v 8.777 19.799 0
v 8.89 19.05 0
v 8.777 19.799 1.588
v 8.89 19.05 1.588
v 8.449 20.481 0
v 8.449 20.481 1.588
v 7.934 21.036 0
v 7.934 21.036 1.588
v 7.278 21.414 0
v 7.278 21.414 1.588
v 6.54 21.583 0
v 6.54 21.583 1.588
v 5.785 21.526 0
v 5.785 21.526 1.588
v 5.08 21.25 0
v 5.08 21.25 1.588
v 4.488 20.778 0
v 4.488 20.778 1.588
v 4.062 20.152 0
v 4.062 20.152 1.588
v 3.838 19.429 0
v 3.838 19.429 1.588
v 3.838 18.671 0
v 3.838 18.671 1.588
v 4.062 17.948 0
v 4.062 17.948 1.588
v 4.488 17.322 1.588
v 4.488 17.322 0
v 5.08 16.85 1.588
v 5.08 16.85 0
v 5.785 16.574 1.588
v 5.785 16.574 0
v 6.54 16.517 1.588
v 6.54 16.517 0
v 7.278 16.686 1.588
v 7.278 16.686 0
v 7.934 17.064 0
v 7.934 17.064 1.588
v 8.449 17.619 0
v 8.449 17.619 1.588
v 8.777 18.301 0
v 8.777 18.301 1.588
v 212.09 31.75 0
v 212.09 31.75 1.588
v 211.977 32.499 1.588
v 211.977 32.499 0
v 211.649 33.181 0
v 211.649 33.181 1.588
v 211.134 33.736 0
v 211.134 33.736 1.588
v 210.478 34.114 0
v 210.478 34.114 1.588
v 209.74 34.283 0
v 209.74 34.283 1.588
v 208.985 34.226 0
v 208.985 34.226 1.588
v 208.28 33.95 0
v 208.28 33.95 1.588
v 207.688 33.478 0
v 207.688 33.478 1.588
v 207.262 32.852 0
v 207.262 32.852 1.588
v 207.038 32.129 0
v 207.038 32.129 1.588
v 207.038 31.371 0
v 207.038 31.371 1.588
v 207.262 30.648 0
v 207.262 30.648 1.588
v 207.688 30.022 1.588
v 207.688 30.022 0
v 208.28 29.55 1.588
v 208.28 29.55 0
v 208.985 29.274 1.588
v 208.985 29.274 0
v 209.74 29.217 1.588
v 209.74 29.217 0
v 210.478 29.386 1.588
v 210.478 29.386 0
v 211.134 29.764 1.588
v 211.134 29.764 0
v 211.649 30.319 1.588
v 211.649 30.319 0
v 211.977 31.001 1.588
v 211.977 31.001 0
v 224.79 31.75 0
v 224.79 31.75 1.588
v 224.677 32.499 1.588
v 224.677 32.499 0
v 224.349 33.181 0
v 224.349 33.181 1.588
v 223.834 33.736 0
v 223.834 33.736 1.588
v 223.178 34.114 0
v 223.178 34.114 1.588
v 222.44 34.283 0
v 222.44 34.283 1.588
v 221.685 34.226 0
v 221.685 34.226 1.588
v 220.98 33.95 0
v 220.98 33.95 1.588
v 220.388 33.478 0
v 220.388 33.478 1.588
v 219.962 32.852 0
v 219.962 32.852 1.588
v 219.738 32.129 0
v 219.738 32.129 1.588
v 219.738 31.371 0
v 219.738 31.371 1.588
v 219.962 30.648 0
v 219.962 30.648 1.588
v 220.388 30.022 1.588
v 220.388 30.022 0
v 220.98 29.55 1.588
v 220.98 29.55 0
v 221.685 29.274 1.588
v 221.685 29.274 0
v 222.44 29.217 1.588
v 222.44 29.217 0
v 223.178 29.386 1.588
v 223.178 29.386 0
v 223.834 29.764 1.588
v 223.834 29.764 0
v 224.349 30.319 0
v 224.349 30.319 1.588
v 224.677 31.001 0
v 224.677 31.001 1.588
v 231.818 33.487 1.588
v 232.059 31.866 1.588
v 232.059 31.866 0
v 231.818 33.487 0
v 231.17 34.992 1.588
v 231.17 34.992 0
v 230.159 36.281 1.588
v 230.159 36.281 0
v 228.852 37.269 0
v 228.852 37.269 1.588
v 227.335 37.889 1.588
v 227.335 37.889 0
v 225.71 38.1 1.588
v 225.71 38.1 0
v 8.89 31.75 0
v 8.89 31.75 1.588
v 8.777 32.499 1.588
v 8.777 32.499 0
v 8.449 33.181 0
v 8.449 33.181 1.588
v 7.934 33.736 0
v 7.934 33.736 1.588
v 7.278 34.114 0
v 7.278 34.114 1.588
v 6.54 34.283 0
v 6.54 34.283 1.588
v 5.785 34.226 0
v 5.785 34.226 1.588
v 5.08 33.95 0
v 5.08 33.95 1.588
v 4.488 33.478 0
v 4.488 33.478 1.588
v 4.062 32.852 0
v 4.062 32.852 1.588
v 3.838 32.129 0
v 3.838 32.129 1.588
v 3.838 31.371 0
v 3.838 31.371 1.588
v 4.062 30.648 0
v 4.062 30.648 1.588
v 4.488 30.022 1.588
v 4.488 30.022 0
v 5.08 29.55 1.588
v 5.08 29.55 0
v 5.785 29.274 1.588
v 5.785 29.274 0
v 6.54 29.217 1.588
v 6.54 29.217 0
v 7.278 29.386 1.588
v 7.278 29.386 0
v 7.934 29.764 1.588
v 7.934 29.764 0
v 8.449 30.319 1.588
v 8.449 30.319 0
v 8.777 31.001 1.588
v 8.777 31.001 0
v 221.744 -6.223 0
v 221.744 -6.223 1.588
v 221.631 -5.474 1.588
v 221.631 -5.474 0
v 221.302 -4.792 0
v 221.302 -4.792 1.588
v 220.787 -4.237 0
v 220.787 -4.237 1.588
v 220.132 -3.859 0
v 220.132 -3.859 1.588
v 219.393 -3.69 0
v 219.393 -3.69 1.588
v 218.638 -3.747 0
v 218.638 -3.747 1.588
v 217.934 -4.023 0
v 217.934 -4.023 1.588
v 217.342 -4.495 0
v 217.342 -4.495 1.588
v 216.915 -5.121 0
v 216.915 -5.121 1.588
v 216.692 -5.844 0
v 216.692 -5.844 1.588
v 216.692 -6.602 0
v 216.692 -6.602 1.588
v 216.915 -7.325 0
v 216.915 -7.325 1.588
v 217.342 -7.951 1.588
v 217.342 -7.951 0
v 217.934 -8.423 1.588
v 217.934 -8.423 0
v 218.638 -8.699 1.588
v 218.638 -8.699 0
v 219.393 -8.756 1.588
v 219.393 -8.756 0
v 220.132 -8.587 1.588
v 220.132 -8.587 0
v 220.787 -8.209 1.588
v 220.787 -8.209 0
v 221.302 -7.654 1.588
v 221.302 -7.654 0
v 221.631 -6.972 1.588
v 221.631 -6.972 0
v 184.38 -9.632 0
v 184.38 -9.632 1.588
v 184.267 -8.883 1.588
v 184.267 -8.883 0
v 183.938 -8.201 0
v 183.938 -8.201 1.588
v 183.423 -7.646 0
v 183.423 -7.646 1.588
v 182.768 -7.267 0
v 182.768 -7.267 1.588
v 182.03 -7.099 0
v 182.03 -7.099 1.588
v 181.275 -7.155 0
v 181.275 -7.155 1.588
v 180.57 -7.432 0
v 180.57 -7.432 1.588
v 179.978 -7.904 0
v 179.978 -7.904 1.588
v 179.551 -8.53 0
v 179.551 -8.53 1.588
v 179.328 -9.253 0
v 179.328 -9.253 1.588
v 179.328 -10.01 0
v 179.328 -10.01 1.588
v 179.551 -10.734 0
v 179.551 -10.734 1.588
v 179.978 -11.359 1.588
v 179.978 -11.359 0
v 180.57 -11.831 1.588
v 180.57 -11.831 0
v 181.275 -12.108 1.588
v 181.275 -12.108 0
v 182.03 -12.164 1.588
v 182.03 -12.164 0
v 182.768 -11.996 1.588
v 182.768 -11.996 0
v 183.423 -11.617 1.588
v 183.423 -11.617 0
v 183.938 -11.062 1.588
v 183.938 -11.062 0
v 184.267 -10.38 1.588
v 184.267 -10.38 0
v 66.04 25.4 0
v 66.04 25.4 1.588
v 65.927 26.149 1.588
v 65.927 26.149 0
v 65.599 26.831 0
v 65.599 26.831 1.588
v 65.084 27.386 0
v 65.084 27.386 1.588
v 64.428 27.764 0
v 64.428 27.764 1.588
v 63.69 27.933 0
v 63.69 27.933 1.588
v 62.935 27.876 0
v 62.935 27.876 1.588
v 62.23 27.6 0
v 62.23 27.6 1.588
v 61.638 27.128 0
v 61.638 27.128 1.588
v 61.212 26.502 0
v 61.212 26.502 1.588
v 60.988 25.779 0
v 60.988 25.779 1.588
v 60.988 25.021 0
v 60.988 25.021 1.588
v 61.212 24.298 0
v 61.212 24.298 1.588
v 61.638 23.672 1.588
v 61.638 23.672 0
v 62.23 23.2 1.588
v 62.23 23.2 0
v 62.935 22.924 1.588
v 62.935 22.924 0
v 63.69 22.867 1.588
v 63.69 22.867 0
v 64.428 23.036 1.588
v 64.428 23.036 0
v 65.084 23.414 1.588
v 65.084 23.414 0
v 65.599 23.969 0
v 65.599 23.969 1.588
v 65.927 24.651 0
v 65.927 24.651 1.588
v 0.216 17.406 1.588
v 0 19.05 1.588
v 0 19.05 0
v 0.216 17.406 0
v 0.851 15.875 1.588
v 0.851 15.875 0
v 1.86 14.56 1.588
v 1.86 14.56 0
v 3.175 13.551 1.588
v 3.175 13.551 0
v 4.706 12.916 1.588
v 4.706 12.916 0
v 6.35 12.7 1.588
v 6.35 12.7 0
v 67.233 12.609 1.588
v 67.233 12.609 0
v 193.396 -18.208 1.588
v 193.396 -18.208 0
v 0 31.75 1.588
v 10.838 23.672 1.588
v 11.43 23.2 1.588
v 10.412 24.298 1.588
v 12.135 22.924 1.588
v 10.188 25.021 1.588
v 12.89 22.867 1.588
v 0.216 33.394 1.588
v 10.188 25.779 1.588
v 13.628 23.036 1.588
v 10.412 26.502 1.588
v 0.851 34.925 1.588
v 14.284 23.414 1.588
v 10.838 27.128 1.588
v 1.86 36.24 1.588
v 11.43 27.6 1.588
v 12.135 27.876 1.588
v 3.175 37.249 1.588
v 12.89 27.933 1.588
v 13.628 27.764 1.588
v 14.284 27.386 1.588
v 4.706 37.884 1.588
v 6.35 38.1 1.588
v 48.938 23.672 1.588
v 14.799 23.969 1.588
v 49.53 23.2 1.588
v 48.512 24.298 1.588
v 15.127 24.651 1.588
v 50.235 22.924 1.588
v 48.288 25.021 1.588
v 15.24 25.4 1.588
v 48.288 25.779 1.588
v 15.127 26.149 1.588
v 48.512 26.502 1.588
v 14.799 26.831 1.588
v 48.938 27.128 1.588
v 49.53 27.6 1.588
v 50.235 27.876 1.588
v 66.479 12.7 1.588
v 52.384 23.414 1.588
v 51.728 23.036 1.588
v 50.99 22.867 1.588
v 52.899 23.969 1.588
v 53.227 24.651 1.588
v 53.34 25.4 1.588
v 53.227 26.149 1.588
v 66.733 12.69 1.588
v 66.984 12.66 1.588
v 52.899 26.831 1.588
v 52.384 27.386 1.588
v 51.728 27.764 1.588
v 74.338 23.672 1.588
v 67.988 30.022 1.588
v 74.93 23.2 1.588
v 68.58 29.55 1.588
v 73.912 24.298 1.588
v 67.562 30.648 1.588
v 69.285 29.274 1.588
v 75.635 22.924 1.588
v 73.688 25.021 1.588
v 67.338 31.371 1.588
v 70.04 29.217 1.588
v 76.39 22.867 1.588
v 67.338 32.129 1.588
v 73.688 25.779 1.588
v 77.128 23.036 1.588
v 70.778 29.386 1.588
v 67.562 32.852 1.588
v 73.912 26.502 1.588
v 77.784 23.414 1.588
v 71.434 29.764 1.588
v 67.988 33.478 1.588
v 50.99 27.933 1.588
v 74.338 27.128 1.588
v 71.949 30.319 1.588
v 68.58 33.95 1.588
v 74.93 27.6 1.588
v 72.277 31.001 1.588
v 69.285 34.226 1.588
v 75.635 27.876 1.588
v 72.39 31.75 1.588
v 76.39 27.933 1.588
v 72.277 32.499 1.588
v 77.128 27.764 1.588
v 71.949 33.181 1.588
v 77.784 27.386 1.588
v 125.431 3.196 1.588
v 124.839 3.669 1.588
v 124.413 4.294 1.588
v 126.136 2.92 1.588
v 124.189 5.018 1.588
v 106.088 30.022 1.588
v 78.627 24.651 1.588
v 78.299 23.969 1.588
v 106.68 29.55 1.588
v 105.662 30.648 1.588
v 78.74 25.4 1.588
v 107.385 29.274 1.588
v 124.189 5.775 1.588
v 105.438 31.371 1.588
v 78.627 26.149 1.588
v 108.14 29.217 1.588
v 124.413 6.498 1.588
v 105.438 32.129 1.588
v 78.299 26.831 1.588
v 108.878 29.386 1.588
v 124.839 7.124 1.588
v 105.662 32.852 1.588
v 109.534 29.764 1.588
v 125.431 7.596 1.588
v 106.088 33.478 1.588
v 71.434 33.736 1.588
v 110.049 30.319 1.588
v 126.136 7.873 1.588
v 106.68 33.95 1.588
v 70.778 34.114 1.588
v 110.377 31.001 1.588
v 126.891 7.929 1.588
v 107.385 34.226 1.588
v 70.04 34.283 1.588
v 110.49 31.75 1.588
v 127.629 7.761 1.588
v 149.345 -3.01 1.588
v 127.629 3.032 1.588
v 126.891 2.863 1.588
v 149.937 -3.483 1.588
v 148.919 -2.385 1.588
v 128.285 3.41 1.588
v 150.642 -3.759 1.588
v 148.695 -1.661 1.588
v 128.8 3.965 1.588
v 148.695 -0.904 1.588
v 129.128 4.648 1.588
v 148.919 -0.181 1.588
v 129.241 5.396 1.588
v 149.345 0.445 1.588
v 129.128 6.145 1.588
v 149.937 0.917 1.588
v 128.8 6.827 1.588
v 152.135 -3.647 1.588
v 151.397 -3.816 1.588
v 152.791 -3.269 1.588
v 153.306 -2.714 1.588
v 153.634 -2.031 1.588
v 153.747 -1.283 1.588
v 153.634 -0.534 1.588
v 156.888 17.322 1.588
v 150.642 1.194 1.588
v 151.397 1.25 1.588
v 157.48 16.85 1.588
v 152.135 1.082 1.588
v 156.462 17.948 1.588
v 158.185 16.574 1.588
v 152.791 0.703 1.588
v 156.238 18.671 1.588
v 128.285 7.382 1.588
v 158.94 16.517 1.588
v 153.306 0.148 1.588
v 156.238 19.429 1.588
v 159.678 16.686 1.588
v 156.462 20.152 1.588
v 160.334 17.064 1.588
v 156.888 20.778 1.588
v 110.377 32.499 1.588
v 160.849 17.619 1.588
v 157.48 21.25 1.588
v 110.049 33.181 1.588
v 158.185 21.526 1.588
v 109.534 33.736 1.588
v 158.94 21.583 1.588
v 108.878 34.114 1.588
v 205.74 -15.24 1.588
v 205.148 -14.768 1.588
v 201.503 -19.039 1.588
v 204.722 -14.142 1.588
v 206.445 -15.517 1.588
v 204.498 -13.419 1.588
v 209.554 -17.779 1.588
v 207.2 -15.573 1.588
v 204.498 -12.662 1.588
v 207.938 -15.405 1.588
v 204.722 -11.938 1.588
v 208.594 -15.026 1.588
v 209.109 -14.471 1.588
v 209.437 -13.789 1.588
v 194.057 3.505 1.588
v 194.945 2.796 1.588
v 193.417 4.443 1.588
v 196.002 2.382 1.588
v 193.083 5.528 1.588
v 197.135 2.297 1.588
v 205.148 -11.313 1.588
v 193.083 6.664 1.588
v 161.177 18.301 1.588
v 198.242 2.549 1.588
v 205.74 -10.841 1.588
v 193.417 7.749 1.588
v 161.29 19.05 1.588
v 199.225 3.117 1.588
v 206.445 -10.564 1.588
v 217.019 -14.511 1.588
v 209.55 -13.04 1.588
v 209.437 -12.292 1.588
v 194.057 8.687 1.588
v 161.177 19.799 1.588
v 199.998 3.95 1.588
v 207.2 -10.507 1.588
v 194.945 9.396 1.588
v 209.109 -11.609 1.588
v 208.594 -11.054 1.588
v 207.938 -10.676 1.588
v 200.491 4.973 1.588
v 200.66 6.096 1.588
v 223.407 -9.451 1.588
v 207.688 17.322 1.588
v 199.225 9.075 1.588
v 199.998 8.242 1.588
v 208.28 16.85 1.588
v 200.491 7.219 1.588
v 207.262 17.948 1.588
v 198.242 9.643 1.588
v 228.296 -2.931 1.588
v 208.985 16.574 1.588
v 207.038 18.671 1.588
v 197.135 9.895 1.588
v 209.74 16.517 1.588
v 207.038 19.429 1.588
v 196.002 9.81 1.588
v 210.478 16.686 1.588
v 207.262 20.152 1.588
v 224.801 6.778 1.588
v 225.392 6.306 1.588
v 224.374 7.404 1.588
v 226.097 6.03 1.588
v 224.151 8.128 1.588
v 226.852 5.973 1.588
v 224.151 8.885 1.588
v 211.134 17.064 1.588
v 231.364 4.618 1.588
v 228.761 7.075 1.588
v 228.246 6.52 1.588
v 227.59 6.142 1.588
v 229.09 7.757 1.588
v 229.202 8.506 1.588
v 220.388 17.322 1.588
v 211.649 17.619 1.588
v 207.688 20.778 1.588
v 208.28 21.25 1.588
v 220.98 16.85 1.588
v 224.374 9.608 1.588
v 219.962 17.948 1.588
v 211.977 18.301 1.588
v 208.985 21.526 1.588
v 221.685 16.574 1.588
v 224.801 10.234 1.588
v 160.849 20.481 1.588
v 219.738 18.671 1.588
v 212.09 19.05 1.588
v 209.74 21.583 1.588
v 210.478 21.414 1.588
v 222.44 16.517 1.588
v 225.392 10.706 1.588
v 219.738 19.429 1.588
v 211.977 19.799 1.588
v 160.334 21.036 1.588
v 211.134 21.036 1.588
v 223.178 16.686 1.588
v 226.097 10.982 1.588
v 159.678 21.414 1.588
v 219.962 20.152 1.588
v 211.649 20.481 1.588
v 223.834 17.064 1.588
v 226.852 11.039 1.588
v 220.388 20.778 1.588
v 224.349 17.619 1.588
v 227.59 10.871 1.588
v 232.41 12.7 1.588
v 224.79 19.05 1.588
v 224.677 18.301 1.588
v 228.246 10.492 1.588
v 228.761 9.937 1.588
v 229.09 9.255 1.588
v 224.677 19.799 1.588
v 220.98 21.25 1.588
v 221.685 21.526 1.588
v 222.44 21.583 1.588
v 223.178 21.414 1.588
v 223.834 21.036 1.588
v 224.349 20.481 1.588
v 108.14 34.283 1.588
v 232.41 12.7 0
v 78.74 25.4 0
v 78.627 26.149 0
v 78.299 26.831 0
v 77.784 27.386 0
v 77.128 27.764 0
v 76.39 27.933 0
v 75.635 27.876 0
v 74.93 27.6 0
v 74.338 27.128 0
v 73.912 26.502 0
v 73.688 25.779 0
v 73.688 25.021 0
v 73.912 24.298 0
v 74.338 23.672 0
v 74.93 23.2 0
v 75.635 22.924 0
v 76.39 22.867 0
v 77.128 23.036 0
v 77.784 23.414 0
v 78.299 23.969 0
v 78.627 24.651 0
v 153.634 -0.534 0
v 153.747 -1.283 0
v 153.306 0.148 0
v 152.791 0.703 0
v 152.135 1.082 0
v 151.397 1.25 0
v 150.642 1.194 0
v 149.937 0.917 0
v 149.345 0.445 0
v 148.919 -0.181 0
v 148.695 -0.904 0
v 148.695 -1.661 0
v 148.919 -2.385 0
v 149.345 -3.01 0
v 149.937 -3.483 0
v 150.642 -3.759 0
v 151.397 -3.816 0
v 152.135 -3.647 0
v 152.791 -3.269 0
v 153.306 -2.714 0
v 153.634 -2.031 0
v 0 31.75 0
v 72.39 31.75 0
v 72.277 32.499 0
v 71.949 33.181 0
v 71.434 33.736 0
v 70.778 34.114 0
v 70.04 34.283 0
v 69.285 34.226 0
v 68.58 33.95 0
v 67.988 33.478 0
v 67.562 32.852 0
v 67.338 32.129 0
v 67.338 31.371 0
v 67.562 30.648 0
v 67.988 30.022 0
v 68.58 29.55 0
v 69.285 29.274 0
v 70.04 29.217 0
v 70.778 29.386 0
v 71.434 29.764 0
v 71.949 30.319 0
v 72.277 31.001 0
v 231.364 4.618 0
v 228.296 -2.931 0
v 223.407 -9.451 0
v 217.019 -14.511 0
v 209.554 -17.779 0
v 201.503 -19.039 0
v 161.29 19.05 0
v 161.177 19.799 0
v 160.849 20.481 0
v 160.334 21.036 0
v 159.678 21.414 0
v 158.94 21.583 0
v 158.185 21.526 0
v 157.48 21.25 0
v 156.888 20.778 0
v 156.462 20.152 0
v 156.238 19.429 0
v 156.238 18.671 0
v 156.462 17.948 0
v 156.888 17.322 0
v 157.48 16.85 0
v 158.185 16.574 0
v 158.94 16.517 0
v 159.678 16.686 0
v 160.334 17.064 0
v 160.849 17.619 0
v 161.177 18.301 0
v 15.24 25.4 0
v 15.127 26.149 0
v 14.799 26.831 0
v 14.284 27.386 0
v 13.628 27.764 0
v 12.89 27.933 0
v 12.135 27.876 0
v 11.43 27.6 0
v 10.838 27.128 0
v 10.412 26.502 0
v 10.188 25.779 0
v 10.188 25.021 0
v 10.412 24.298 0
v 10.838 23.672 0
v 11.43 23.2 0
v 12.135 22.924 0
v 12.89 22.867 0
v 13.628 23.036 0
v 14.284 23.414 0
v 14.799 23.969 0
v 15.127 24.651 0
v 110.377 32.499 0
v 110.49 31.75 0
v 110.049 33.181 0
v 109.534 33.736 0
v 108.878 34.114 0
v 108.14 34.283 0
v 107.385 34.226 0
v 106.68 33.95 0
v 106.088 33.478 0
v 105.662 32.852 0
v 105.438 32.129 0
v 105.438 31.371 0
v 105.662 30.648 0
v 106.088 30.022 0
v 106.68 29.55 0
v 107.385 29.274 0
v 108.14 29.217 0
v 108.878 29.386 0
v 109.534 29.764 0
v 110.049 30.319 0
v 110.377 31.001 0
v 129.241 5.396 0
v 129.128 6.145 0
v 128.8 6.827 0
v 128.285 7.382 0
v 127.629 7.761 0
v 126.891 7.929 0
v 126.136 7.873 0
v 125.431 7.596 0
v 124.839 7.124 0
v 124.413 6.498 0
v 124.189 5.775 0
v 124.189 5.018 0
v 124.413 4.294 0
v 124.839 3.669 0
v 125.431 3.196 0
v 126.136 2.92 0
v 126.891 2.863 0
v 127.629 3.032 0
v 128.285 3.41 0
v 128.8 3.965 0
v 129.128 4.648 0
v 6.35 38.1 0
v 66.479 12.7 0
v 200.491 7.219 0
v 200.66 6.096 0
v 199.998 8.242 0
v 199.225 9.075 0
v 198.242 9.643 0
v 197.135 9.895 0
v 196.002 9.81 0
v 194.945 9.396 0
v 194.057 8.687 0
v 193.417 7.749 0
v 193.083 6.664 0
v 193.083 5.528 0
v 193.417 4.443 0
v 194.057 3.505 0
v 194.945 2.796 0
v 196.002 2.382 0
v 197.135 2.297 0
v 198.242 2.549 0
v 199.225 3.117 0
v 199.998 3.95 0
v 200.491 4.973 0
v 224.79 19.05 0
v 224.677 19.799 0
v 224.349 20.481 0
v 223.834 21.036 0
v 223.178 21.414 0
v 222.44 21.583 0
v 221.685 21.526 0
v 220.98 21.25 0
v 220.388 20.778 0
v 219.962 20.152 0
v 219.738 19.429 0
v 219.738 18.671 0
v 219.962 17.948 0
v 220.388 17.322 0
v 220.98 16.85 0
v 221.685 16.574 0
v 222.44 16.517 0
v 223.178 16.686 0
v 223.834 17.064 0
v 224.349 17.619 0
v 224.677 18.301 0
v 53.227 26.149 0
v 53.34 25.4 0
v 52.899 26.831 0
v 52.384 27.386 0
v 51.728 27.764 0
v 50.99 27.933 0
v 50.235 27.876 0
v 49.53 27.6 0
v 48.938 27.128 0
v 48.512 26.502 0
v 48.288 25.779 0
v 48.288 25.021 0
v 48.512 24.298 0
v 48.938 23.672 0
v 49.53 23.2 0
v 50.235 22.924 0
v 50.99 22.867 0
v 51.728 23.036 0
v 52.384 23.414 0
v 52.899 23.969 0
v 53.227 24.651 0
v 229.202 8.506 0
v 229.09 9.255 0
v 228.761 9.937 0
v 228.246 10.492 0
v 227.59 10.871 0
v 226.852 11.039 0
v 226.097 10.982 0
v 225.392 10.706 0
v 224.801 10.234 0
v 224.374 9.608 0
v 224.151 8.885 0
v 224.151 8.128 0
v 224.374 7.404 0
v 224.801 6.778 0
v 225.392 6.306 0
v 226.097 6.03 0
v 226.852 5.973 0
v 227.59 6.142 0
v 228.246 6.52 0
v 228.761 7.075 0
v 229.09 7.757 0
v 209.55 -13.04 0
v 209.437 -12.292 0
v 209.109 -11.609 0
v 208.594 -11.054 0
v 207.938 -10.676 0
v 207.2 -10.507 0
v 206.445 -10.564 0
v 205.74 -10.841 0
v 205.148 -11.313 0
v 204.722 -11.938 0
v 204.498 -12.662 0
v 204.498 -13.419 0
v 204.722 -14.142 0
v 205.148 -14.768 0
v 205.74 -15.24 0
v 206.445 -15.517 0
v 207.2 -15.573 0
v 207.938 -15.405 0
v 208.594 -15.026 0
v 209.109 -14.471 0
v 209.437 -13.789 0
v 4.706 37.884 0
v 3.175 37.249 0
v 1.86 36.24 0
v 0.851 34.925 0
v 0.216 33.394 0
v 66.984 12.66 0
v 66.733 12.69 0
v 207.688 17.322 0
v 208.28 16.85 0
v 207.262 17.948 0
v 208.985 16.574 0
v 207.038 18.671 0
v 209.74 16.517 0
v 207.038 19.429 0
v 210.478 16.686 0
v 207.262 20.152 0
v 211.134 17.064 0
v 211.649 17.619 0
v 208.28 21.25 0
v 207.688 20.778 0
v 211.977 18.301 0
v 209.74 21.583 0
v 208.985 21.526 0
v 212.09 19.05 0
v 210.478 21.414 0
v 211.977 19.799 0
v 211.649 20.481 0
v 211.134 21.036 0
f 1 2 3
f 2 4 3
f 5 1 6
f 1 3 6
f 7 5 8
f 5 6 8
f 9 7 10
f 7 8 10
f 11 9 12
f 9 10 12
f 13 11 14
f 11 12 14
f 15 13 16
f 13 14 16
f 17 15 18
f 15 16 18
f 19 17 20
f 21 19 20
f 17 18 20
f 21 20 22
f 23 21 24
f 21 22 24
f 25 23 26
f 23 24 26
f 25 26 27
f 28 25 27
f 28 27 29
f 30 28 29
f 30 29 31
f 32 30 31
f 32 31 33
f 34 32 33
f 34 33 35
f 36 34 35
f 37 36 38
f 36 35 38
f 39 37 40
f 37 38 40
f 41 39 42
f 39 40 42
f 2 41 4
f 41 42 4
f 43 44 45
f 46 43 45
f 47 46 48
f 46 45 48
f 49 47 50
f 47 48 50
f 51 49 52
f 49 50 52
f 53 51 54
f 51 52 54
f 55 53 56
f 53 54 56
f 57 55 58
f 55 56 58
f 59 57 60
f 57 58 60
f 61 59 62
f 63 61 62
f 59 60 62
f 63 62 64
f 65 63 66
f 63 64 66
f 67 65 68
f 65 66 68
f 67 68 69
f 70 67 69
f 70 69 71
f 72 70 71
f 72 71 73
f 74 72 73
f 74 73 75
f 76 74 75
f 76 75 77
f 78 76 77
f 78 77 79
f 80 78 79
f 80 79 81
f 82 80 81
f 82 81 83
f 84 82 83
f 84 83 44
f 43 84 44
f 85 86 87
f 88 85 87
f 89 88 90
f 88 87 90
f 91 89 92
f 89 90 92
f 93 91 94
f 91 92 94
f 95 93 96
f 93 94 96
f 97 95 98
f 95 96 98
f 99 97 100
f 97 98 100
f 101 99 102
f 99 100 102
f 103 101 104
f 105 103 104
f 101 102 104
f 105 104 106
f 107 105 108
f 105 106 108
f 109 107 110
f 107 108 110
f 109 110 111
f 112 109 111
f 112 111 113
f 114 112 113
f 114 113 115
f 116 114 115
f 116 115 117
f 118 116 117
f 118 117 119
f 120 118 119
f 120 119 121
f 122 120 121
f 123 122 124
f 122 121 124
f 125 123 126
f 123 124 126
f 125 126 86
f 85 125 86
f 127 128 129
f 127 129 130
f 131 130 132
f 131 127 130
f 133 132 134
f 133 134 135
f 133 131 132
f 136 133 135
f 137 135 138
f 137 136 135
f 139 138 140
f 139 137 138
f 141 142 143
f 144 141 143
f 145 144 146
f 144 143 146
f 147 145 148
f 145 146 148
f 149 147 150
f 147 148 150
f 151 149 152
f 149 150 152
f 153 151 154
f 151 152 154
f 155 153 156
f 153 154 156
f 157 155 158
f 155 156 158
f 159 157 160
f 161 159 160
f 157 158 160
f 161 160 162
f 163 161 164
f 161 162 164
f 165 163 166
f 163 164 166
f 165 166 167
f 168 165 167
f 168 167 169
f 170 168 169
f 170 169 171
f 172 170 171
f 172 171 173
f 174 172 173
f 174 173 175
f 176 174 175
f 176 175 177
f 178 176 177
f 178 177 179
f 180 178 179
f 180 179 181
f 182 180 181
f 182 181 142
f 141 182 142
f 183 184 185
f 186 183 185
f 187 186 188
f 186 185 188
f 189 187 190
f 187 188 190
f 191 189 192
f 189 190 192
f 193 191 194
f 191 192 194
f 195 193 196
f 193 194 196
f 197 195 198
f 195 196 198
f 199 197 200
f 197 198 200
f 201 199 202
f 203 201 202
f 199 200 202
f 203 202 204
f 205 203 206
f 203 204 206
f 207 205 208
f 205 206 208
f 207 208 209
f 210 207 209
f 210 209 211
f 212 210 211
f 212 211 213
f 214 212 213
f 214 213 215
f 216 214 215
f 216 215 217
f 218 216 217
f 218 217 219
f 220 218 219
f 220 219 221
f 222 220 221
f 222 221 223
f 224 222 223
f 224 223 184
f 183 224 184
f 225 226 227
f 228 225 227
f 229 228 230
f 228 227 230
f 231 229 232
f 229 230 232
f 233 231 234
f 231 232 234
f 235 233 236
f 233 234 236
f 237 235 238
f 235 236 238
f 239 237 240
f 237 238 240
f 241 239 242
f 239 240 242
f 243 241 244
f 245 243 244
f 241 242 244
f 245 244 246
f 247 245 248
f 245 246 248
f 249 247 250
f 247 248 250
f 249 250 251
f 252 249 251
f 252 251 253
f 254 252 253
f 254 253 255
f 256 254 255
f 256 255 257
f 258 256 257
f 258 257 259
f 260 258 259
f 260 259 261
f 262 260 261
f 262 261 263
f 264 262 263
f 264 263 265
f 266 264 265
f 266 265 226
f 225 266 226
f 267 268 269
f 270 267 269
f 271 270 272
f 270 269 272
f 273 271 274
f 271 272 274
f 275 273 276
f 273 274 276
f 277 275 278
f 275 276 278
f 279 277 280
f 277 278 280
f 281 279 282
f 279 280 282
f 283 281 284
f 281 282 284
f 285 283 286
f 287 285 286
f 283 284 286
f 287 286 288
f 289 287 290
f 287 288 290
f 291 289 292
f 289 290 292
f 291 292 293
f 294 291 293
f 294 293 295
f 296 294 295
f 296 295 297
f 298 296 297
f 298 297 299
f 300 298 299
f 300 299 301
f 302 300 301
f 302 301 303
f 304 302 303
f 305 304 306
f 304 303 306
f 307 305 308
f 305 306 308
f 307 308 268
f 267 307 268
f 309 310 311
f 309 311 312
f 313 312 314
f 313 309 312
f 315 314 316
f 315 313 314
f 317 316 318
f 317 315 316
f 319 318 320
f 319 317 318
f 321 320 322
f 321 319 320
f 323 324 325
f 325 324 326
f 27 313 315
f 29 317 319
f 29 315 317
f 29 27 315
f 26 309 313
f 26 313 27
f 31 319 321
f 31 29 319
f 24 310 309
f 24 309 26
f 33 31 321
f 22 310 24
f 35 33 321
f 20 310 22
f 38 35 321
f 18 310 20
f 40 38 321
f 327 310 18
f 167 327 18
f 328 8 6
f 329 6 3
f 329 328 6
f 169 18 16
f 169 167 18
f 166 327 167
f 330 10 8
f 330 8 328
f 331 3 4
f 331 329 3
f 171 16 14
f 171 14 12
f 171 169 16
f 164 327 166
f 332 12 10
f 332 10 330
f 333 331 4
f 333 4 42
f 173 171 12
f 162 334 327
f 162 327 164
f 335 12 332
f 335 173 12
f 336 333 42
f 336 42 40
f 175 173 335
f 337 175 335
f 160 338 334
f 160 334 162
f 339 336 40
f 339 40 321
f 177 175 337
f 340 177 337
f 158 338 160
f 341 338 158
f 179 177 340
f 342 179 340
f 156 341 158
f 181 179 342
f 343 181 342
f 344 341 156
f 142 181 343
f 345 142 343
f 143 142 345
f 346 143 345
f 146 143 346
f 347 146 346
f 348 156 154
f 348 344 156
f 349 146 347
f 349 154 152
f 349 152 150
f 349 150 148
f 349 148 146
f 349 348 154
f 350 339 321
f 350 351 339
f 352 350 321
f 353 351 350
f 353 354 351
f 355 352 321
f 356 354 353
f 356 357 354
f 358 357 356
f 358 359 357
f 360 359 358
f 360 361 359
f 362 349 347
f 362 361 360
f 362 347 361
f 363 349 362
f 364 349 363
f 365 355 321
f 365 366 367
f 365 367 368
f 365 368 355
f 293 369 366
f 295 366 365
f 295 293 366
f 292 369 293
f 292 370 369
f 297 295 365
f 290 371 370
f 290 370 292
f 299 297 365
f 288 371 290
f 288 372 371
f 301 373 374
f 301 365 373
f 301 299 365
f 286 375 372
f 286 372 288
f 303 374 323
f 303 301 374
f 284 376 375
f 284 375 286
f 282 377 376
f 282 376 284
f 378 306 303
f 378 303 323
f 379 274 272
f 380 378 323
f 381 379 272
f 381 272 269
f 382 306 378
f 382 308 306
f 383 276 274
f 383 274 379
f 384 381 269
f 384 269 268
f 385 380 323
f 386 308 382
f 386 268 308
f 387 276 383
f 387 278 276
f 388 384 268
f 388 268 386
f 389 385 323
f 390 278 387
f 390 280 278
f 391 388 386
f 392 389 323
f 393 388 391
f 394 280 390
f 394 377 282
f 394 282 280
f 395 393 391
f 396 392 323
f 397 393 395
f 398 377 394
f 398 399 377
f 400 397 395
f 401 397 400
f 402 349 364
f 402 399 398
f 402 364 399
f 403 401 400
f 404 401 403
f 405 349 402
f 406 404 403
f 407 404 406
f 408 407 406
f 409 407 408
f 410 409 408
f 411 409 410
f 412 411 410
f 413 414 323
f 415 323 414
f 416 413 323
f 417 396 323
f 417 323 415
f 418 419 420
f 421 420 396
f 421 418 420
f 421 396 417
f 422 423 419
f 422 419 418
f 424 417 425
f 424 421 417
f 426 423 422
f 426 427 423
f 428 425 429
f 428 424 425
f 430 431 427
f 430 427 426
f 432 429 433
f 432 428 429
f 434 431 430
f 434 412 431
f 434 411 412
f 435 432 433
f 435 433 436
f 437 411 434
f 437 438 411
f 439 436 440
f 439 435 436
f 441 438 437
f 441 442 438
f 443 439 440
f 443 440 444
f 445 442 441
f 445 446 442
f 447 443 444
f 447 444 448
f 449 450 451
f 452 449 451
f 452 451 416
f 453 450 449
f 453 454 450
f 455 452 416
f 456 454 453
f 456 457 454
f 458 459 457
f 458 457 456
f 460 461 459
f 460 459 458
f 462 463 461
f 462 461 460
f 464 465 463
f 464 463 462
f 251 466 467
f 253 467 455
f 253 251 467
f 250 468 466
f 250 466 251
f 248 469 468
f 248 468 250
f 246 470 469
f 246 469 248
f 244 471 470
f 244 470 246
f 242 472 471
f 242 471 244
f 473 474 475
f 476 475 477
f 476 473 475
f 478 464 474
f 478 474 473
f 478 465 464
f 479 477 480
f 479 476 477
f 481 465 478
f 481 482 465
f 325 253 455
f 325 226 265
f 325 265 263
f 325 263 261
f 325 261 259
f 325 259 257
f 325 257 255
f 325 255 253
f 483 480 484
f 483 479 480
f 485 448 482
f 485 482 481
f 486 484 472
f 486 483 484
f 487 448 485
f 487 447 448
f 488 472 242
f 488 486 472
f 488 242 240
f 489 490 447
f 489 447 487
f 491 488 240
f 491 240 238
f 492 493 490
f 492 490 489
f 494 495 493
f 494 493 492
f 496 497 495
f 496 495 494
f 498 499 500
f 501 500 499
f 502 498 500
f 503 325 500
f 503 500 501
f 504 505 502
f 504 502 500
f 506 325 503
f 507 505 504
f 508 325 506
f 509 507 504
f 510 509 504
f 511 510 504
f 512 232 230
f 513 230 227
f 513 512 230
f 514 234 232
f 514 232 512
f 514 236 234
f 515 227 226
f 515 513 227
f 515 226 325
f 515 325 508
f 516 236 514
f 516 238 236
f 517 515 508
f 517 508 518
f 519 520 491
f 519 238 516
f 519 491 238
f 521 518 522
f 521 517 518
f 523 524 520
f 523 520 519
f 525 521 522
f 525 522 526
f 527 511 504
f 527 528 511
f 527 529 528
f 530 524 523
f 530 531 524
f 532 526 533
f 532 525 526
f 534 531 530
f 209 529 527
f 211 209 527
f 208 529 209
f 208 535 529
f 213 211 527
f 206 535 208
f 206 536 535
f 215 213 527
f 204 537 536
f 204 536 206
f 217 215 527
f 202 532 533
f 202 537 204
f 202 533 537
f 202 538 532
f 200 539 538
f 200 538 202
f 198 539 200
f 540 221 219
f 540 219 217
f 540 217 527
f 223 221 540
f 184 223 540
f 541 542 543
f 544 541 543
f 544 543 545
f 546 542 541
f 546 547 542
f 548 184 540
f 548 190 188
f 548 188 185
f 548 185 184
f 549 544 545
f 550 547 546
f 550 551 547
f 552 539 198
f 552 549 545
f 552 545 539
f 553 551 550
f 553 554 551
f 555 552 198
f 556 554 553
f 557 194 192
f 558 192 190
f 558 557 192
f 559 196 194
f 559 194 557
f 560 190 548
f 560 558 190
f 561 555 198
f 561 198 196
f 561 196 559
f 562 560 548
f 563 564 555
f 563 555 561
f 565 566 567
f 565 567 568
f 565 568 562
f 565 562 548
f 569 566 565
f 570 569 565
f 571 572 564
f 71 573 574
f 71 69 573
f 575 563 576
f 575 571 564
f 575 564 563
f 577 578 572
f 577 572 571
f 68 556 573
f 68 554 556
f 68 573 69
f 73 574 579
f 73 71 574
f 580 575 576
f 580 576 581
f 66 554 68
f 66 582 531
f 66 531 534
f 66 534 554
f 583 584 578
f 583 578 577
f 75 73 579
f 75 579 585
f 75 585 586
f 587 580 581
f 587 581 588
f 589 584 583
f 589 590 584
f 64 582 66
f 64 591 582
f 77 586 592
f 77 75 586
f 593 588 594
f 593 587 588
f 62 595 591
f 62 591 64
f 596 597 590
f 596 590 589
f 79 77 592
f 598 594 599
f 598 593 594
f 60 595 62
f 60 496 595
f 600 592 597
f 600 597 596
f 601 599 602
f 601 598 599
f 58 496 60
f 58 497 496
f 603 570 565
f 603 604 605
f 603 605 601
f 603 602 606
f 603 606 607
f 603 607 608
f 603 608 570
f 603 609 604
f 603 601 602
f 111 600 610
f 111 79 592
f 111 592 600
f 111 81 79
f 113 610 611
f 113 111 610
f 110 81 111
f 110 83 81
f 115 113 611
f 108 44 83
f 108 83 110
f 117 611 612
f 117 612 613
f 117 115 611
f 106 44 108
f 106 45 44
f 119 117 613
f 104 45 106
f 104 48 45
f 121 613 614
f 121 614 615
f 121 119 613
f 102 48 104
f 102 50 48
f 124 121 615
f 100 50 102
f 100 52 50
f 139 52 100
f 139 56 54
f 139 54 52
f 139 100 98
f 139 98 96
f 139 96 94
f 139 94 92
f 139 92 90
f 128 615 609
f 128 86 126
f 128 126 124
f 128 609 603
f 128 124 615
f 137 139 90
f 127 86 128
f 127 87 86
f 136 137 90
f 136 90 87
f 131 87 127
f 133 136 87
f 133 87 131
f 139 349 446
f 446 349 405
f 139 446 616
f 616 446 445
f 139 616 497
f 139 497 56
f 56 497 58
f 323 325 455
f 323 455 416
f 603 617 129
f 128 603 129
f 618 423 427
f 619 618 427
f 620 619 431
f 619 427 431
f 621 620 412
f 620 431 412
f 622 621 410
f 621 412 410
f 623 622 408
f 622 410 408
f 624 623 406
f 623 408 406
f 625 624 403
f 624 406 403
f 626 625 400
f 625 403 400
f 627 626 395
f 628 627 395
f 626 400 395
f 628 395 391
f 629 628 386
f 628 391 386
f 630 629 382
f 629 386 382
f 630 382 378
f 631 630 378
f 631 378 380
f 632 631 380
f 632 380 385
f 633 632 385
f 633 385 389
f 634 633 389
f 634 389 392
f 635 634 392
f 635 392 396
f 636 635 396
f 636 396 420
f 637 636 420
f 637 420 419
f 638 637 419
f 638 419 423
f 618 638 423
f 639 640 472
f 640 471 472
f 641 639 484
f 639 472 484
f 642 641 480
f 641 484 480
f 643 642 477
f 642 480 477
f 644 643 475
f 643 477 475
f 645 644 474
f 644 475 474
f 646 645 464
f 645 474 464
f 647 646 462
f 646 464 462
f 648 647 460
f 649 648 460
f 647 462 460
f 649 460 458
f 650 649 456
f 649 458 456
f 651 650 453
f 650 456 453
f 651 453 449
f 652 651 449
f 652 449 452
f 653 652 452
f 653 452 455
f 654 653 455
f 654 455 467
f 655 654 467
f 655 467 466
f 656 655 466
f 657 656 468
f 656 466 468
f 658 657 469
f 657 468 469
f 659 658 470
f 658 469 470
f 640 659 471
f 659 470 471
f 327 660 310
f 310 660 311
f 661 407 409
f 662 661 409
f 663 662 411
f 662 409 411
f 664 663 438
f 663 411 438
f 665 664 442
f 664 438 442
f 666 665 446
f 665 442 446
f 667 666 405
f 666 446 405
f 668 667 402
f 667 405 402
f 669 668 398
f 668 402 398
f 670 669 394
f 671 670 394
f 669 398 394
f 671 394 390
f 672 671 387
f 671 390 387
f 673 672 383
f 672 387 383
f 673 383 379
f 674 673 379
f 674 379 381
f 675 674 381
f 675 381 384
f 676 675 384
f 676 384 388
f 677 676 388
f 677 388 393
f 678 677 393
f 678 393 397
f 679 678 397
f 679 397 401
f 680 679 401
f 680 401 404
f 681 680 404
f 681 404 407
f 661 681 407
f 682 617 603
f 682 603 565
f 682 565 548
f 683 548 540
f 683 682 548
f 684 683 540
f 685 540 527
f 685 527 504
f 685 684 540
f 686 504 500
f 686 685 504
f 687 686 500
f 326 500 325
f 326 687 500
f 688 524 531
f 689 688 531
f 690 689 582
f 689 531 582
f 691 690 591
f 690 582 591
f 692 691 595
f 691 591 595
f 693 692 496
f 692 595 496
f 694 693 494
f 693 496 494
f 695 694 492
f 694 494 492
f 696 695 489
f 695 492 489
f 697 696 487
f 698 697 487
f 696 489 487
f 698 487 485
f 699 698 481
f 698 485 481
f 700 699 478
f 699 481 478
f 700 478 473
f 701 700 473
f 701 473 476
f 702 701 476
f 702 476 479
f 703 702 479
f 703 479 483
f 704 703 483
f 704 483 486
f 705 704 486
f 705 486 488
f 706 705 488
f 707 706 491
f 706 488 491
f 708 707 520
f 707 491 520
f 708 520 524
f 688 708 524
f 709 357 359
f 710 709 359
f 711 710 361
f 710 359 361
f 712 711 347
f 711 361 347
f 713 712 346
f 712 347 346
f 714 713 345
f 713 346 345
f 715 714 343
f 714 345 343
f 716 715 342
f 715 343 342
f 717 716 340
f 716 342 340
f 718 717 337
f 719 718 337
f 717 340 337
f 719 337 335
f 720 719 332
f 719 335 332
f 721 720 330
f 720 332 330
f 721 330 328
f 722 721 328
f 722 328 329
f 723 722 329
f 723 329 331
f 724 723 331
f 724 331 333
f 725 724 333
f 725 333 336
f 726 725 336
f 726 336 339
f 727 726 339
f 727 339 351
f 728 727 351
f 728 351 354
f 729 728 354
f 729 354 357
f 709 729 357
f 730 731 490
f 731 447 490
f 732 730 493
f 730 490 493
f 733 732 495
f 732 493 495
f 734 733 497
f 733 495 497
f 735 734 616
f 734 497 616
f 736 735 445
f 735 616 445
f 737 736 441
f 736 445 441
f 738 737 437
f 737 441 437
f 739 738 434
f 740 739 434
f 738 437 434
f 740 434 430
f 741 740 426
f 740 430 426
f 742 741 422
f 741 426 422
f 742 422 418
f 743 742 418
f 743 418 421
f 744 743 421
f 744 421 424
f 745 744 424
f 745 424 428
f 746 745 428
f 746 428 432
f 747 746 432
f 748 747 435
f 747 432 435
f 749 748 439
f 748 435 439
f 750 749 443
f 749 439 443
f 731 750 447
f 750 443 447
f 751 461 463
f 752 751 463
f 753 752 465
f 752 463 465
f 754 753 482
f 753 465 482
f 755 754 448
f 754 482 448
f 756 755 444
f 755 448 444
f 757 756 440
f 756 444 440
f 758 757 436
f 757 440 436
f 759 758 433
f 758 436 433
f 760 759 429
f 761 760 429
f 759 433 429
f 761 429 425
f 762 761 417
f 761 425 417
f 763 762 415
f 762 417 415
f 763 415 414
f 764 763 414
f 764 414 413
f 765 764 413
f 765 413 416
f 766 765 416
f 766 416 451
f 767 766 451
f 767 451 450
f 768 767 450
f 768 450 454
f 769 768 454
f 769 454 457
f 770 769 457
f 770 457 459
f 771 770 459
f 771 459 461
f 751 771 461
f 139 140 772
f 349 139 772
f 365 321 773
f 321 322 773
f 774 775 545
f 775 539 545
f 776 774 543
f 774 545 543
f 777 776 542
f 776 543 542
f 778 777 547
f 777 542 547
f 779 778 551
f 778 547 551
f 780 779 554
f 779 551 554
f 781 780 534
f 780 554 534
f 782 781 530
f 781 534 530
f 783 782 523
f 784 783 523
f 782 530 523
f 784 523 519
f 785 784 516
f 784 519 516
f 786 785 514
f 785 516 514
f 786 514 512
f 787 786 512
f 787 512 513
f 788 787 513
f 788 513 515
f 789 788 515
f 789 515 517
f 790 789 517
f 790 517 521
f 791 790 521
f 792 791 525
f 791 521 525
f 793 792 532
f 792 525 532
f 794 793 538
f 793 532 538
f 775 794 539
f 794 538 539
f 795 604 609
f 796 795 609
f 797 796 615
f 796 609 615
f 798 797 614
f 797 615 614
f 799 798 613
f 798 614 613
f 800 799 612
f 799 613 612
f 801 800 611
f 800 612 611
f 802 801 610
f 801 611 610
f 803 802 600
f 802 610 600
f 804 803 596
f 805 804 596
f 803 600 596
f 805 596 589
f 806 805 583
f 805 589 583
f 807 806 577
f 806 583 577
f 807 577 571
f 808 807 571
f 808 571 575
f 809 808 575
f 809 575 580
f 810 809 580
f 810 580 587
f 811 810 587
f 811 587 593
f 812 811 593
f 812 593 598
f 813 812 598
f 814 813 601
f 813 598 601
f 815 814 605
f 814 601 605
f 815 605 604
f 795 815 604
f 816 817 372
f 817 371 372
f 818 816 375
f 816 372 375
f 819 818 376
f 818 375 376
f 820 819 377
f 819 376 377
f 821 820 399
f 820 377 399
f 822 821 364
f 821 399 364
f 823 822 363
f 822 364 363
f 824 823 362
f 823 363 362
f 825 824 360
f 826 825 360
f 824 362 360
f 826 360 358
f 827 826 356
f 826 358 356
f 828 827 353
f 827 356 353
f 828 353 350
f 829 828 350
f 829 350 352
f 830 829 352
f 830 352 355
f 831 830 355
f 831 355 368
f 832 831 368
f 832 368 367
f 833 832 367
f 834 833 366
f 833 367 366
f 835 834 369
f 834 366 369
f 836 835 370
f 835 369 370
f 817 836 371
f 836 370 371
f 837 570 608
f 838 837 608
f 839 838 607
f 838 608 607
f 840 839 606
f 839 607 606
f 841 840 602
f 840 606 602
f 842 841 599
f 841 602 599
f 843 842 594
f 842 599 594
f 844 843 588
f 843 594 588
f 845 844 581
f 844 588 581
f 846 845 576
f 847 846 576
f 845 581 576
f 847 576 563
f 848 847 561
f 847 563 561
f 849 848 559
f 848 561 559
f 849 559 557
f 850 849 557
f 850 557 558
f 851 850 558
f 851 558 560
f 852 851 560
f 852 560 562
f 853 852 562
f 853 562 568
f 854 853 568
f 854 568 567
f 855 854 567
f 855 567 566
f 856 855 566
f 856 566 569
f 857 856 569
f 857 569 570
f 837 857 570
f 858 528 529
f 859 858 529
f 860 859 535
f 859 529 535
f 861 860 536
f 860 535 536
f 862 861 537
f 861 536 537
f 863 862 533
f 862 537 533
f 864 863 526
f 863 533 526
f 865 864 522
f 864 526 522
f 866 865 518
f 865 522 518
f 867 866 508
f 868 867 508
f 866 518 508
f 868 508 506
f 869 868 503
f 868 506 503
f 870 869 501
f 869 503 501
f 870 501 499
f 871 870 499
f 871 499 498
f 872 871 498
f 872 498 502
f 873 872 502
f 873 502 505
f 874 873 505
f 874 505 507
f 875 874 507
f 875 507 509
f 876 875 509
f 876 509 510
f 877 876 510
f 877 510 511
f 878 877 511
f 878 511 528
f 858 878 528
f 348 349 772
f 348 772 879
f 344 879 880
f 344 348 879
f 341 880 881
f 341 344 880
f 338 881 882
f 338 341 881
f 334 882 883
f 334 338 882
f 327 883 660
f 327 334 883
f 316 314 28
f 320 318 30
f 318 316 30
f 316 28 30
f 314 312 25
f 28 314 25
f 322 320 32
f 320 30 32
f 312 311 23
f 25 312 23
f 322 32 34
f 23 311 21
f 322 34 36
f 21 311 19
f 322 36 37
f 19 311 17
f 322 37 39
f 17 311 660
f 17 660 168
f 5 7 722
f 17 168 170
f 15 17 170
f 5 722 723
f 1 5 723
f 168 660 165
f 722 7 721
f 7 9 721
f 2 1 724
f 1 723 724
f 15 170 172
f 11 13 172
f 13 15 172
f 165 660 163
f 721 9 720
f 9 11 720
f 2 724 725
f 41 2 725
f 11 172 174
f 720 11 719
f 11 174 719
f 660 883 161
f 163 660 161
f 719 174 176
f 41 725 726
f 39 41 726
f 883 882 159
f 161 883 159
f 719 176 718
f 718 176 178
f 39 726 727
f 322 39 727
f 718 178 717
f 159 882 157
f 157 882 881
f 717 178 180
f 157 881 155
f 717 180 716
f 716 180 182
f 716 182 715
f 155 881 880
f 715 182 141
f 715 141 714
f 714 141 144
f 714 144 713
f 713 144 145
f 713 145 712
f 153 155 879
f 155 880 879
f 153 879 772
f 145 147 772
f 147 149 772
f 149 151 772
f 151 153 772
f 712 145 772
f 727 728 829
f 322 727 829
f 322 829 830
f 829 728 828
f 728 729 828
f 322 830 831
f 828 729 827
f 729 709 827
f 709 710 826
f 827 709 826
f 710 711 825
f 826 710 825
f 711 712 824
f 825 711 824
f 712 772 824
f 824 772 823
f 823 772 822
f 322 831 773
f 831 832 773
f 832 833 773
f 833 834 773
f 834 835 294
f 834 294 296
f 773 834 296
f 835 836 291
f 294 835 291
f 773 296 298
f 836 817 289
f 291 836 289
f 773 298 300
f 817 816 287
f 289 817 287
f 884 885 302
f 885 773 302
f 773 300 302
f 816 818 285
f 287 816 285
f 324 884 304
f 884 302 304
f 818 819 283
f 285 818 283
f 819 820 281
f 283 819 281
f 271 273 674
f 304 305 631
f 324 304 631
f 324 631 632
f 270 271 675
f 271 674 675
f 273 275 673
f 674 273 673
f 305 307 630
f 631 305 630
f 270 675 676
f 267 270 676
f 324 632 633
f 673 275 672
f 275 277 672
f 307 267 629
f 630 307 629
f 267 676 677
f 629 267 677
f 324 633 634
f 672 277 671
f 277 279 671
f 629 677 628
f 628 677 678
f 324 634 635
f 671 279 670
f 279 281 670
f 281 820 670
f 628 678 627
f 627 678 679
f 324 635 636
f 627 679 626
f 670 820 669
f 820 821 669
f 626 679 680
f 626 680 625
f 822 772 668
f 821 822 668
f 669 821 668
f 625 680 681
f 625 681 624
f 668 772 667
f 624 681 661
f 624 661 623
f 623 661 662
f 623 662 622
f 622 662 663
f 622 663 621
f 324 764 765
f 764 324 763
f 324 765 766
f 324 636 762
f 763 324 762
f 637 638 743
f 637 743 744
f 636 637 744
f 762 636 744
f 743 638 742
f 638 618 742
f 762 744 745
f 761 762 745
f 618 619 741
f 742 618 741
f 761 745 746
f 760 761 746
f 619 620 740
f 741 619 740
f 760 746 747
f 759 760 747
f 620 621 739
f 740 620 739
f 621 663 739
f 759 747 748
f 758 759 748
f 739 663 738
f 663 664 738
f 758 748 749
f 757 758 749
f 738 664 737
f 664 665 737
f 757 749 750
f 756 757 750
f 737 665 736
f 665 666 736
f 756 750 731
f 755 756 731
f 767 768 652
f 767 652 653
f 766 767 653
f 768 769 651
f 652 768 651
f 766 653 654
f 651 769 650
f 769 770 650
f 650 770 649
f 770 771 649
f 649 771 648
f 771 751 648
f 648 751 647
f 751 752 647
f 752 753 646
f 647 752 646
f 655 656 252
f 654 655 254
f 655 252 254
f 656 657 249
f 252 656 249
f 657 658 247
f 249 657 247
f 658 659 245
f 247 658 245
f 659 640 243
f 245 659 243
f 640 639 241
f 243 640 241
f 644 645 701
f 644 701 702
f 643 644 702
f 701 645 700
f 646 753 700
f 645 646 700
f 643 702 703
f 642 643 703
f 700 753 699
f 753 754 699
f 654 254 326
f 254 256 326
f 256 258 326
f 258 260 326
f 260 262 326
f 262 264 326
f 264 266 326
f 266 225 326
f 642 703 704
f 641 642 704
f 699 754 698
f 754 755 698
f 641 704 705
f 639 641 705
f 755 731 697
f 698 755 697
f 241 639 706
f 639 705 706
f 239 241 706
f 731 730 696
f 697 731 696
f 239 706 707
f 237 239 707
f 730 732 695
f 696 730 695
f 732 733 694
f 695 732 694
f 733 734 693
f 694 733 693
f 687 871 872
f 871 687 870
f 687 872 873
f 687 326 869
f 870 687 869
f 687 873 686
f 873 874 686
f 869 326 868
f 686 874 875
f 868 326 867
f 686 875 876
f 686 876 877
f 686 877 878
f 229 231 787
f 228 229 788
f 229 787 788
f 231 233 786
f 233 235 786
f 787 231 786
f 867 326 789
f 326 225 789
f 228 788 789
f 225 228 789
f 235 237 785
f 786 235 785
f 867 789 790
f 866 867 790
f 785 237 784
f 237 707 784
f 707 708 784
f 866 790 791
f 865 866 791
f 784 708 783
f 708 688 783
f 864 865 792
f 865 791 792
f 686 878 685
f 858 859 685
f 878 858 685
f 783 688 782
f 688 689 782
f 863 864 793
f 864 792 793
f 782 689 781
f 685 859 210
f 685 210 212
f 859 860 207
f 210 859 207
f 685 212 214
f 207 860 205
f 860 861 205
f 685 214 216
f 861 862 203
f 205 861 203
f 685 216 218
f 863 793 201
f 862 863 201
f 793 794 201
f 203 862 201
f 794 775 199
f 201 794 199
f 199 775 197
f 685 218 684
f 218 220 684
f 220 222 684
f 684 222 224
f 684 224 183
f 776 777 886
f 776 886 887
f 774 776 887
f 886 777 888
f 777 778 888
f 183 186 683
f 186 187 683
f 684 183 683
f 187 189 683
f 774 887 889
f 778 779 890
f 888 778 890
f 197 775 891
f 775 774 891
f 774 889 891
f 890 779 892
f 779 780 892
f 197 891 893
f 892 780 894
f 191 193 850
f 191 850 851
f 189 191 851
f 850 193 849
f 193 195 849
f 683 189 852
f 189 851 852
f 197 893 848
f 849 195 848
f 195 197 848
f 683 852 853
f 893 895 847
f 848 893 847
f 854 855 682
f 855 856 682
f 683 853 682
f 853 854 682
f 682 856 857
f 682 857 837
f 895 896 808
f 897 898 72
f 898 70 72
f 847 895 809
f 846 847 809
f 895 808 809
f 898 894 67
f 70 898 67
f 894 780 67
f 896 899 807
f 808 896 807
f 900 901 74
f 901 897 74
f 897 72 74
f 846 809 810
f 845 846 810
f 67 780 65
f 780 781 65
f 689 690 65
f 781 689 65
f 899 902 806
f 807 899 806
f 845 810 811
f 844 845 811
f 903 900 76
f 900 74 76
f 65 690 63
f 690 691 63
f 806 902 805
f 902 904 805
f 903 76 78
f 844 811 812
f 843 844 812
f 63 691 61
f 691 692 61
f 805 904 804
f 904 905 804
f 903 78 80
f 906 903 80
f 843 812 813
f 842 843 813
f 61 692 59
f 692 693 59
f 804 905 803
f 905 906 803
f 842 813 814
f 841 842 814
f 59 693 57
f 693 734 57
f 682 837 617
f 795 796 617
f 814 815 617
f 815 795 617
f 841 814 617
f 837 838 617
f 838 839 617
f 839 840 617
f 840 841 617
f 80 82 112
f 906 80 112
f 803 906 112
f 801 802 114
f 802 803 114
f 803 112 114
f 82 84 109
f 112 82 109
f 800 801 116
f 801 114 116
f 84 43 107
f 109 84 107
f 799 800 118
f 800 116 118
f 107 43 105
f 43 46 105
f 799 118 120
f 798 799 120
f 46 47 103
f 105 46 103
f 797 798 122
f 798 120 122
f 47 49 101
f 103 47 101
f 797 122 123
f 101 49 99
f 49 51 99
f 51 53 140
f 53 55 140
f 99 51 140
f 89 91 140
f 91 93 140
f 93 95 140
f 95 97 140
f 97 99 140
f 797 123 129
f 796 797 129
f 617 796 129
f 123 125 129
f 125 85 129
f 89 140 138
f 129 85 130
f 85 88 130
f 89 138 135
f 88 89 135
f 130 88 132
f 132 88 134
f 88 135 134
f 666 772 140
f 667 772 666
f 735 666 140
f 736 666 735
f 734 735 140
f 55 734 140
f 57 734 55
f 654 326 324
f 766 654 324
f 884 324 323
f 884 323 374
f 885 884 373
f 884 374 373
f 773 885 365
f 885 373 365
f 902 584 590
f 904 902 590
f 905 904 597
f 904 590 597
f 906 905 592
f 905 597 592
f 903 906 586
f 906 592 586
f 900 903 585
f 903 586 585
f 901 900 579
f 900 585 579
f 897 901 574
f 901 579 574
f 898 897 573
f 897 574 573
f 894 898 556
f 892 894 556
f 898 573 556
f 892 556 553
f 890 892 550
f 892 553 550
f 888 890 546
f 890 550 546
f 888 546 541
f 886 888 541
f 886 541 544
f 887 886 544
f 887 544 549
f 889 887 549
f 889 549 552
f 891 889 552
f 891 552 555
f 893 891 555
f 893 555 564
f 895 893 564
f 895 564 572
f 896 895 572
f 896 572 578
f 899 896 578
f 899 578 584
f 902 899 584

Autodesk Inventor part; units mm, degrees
ref_plane "YZ Plane" through (0, 0, 0) normal (1, 0, 0) x (0, 1, 0)
ref_plane "XZ Plane" through (0, 0, 0) normal (0, 1, 0) x (-1, 0, 0)
ref_plane "XY Plane" through (0, 0, 0) normal (0, 0, 1) x (1, 0, 0)
sketch "Sketch1" plane through (0, 0, 0) normal (0, 0, 1) x (1, 0, 0)
  line L0 (0, 0) -> (247.65, 0)
  line L1 (247.65, 0) -> (247.65, 38.1)
  line L2 (247.65, 38.1) -> (0, 38.1)
  line L3 (0, 38.1) -> (0, 0)
  line L4 (286.1616, 0) -> (255.1962, 0)
  line L5 (255.1962, 0) -> (255.1962, 12.7)
  line L6 (255.1962, 12.7) -> (286.1616, 12.7)
  line L7 (286.1616, 12.7) -> (286.1616, 0)
  line L8 (247.65, 12.7) -> (200.66, 12.7)
  line L9 (16.2468, 38.1) -> (16.2468, 12.7)
  line L10 (16.2468, 12.7) -> (196.85, 12.7)
  line L11 (0, 12.7) -> (17.7951, 12.7)
  circle A0 centre (200.66, 12.7) radius 31.75
  line L12 (232.41, 12.7) -> (231.9451, 38.1)
  line L13 (66.8614, 12.7) -> (200.8653, -20.0324)
  line L14 (193.3963, -18.208) -> (168.91, 12.7)
  point P0 (187.853, -16.3524)
  point P1 (232.3887, 13.8619)
  point P2 (229.7594, 0)
  point P3 (181.61, 38.1)
  point P4 (219.71, 38.1)
  point P5 (171.5606, 0)
  dimension "d0" = 247.65
  dimension "d1" = 38.1
  dimension "d2" = 12.7
  dimension "d3" = 30.9654
  dimension "d4" = 46.99
  dimension "d10" = 25.4
  dimension "d54" = 63.5
extrude "Extrusion4" add sketch "Sketch1" along normal blind 1.5875 contours L13 L0 A0 | L13 L10 A0 L0 | L3 L2 L9 L11 | A0 L14 L0 | L0 L14 A0 | L10 L9 L2 A0 | L14 L0 A0 | L14 A0 L2 L12 L0 | L2 L12 A0
fillet "Fillet6" radius 6.35 3 edges at (0, 38.1, 0.7937) (0, 12.7, 0.7937) (231.9451, 38.1, 0.7937)
sketch "Sketch4" plane through (0, 0, 1.5875) normal (0, 0, 1) x (1, 0, 0)
  arc A0 (6.35, 38.1) -> (0, 31.75) centre (6.35, 31.75) ccw projected
  line L0 (6.35, 38.1) -> (6.35, 31.75)
  line L1 (6.35, 31.75) -> (0, 31.75)
  circle A1 centre (6.35, 31.75) radius 2.54
  line L2 (6.35, 31.75) -> (6.35, 19.05)
  circle A2 centre (6.35, 19.05) radius 2.54
  line L3 (6.35, 31.75) -> (57.15, 31.75)
  line L4 (57.15, 31.75) -> (107.95, 31.75)
  line L5 (107.95, 31.75) -> (158.75, 31.75)
  line L6 (158.75, 31.75) -> (209.55, 31.75)
  circle A3 centre (107.95, 31.75) radius 2.54
  circle A4 centre (209.55, 31.75) radius 2.54
  line L7 (57.15, 31.75) -> (57.15, 19.05)
  line L8 (57.15, 19.05) -> (107.95, 19.05)
  line L9 (107.95, 19.05) -> (158.75, 19.05)
  line L10 (158.75, 19.05) -> (209.55, 19.05)
  circle A5 centre (158.75, 19.05) radius 2.54
  circle A6 centre (209.55, 19.05) radius 2.54
  line L11 (225.7103, 38.1) -> (6.35, 38.1) projected
  arc A7 (193.3963, -18.208) -> (232.41, 12.7) centre (200.66, 12.7) ccw projected
  line L12 (209.55, 31.75) -> (196.85, 31.75)
  line L13 (196.85, 31.75) -> (196.85, 19.05)
  circle A8 centre (196.85, 31.75) radius 2.54
  line L14 (196.85, 19.05) -> (196.85, 6.096)
  circle A9 centre (196.85, 6.096) radius 3.81
  line L15 (57.15, 31.75) -> (69.85, 31.75)
  circle A10 centre (69.85, 31.75) radius 2.54
  point P0 (0, 0)
  point P1 (207.01, 31.75)
  dimension "d60" = 6.35
  dimension "d61" = 5.08
  dimension "d62" = 12.7
  dimension "d63" = 5.08
  dimension "d64" = 50.8
  dimension "d65" = 50.8
  dimension "d66" = 50.8
  dimension "d67" = 50.8
  dimension "d70" = 5.08
  dimension "d72" = 5.08
  dimension "d75" = 5.08
  dimension "d76" = 5.08
  dimension "d86" = 12.7
  dimension "d88" = 5.08
  dimension "d89" = 12.954
  dimension "d90" = 7.62
  dimension "d116" = 12.7
  dimension "d117" = 5.08
extrude "Extrusion5" cut sketch "Sketch4" against normal blind 25.4 contours A4 | A6 | A9 | A2 | A1 L3 L0 | L0 L1 A1 | L1 L2 A1 | L3 A1 L2 | A10 L4 | L4 A10 | A3 L5 L4 | L4 L5 A3 | A5 L10 L9 | L9 L10 A5
sketch "Sketch5" plane through (0, 0, 1.5875) normal (0, 0, 1) x (1, 0, 0)
  circle A0 centre (209.55, 31.75) radius 2.54 projected
  line L0 (209.55, 31.75) -> (222.25, 31.75)
  line L1 (222.25, 31.75) -> (222.25, 19.05)
  line L2 (222.25, 19.05) -> (226.6625, 8.5061)
  line L3 (226.6625, 8.5061) -> (219.2036, -6.223)
  line L4 (219.2036, -6.223) -> (207.01, -13.0403)
  line L5 (207.01, -13.0403) -> (181.8398, -9.6316)
  line L6 (181.8398, -9.6316) -> (151.2071, -1.2828)
  line L7 (151.2071, -1.2828) -> (126.701, 5.3962)
  circle A1 centre (126.701, 5.3962) radius 2.54
  circle A2 centre (151.2071, -1.2828) radius 2.54
  circle A3 centre (181.8398, -9.6316) radius 2.54
  circle A4 centre (207.01, -13.0403) radius 2.54
  circle A5 centre (219.2036, -6.223) radius 2.54
  circle A6 centre (226.6625, 8.5061) radius 2.54
  circle A7 centre (222.25, 19.05) radius 2.54
  circle A8 centre (222.25, 31.75) radius 2.54
  circle A9 centre (6.35, 19.05) radius 2.54 projected
  line L8 (6.35, 19.05) -> (15.3303, 28.0303)
  line L9 (6.35, 19.05) -> (19.05, 19.05) construction
  circle A10 centre (6.35, 31.75) radius 2.54 projected
  line L10 (6.35, 31.75) -> (15.3303, 22.7697)
  line L11 (6.35, 31.75) -> (19.05, 31.75) construction
  circle A11 centre (12.7, 25.4) radius 2.54
  line L12 (12.7, 25.4) -> (50.8, 25.4)
  circle A12 centre (50.8, 25.4) radius 2.54
  line L13 (12.7, 25.4) -> (25.4, 25.4)
  line L14 (25.4, 25.4) -> (38.1, 25.4)
  line L15 (50.8, 25.4) -> (63.5, 25.4)
  line L16 (63.5, 25.4) -> (76.2, 25.4)
  circle A13 centre (63.5, 25.4) radius 2.54
  circle A14 centre (76.2, 25.4) radius 2.54
  point P0 (0, 0)
  dimension "d91" = 12.7
  dimension "d92" = 12.7
  dimension "d93" = 11.43
  dimension "d94" = 16.51
  dimension "d95" = 13.97
  dimension "d96" = 25.4
  dimension "d97" = 31.75
  dimension "d98" = 25.4
  dimension "d99" = 5.08
  dimension "d100" = 5.08
  dimension "d101" = 5.08
  dimension "d102" = 5.08
  dimension "d103" = 5.08
  dimension "d104" = 5.08
  dimension "d105" = 5.08
  dimension "d106" = 5.08
  dimension "d109" = 12.7
  dimension "d110" = 45
  dimension "d111" = 12.7
  dimension "d112" = 45
  dimension "d113" = 5.08
  dimension "d114" = 38.1
  dimension "d115" = 5.08
  dimension "d118" = 12.7
  dimension "d119" = 12.7
  dimension "d122" = 12.7
  dimension "d123" = 12.7
  dimension "d124" = 5.08
  dimension "d125" = 5.08
extrude "Extrusion6" cut sketch "Sketch5" against normal blind 25.4 contours A1 | A2 L7 L6 | L6 L7 A2 | A3 L6 L5 | L5 L6 A3 | A4 L5 L4 | L4 L5 A4 | A5 L4 L3 | L3 L4 A5 | A6 L3 L2 | L2 L3 A6 | A7 L2 L1 | L1 L2 A7 | A8 L1 L0 | L0 L1 A8 | A14 | A13 L16 L15 | L15 L16 A13 | A12 L15 L12 | L12 L15 A12 | A11 L10 L8 | L8 L10 A11 | L10 A11 L8 | L12 A11 L10 | L8 A11 L12
fillet "Fillet7" radius 3.175 1 edges at (66.8614, 12.7, 0.7937)
properties part number "intake sled v5"
